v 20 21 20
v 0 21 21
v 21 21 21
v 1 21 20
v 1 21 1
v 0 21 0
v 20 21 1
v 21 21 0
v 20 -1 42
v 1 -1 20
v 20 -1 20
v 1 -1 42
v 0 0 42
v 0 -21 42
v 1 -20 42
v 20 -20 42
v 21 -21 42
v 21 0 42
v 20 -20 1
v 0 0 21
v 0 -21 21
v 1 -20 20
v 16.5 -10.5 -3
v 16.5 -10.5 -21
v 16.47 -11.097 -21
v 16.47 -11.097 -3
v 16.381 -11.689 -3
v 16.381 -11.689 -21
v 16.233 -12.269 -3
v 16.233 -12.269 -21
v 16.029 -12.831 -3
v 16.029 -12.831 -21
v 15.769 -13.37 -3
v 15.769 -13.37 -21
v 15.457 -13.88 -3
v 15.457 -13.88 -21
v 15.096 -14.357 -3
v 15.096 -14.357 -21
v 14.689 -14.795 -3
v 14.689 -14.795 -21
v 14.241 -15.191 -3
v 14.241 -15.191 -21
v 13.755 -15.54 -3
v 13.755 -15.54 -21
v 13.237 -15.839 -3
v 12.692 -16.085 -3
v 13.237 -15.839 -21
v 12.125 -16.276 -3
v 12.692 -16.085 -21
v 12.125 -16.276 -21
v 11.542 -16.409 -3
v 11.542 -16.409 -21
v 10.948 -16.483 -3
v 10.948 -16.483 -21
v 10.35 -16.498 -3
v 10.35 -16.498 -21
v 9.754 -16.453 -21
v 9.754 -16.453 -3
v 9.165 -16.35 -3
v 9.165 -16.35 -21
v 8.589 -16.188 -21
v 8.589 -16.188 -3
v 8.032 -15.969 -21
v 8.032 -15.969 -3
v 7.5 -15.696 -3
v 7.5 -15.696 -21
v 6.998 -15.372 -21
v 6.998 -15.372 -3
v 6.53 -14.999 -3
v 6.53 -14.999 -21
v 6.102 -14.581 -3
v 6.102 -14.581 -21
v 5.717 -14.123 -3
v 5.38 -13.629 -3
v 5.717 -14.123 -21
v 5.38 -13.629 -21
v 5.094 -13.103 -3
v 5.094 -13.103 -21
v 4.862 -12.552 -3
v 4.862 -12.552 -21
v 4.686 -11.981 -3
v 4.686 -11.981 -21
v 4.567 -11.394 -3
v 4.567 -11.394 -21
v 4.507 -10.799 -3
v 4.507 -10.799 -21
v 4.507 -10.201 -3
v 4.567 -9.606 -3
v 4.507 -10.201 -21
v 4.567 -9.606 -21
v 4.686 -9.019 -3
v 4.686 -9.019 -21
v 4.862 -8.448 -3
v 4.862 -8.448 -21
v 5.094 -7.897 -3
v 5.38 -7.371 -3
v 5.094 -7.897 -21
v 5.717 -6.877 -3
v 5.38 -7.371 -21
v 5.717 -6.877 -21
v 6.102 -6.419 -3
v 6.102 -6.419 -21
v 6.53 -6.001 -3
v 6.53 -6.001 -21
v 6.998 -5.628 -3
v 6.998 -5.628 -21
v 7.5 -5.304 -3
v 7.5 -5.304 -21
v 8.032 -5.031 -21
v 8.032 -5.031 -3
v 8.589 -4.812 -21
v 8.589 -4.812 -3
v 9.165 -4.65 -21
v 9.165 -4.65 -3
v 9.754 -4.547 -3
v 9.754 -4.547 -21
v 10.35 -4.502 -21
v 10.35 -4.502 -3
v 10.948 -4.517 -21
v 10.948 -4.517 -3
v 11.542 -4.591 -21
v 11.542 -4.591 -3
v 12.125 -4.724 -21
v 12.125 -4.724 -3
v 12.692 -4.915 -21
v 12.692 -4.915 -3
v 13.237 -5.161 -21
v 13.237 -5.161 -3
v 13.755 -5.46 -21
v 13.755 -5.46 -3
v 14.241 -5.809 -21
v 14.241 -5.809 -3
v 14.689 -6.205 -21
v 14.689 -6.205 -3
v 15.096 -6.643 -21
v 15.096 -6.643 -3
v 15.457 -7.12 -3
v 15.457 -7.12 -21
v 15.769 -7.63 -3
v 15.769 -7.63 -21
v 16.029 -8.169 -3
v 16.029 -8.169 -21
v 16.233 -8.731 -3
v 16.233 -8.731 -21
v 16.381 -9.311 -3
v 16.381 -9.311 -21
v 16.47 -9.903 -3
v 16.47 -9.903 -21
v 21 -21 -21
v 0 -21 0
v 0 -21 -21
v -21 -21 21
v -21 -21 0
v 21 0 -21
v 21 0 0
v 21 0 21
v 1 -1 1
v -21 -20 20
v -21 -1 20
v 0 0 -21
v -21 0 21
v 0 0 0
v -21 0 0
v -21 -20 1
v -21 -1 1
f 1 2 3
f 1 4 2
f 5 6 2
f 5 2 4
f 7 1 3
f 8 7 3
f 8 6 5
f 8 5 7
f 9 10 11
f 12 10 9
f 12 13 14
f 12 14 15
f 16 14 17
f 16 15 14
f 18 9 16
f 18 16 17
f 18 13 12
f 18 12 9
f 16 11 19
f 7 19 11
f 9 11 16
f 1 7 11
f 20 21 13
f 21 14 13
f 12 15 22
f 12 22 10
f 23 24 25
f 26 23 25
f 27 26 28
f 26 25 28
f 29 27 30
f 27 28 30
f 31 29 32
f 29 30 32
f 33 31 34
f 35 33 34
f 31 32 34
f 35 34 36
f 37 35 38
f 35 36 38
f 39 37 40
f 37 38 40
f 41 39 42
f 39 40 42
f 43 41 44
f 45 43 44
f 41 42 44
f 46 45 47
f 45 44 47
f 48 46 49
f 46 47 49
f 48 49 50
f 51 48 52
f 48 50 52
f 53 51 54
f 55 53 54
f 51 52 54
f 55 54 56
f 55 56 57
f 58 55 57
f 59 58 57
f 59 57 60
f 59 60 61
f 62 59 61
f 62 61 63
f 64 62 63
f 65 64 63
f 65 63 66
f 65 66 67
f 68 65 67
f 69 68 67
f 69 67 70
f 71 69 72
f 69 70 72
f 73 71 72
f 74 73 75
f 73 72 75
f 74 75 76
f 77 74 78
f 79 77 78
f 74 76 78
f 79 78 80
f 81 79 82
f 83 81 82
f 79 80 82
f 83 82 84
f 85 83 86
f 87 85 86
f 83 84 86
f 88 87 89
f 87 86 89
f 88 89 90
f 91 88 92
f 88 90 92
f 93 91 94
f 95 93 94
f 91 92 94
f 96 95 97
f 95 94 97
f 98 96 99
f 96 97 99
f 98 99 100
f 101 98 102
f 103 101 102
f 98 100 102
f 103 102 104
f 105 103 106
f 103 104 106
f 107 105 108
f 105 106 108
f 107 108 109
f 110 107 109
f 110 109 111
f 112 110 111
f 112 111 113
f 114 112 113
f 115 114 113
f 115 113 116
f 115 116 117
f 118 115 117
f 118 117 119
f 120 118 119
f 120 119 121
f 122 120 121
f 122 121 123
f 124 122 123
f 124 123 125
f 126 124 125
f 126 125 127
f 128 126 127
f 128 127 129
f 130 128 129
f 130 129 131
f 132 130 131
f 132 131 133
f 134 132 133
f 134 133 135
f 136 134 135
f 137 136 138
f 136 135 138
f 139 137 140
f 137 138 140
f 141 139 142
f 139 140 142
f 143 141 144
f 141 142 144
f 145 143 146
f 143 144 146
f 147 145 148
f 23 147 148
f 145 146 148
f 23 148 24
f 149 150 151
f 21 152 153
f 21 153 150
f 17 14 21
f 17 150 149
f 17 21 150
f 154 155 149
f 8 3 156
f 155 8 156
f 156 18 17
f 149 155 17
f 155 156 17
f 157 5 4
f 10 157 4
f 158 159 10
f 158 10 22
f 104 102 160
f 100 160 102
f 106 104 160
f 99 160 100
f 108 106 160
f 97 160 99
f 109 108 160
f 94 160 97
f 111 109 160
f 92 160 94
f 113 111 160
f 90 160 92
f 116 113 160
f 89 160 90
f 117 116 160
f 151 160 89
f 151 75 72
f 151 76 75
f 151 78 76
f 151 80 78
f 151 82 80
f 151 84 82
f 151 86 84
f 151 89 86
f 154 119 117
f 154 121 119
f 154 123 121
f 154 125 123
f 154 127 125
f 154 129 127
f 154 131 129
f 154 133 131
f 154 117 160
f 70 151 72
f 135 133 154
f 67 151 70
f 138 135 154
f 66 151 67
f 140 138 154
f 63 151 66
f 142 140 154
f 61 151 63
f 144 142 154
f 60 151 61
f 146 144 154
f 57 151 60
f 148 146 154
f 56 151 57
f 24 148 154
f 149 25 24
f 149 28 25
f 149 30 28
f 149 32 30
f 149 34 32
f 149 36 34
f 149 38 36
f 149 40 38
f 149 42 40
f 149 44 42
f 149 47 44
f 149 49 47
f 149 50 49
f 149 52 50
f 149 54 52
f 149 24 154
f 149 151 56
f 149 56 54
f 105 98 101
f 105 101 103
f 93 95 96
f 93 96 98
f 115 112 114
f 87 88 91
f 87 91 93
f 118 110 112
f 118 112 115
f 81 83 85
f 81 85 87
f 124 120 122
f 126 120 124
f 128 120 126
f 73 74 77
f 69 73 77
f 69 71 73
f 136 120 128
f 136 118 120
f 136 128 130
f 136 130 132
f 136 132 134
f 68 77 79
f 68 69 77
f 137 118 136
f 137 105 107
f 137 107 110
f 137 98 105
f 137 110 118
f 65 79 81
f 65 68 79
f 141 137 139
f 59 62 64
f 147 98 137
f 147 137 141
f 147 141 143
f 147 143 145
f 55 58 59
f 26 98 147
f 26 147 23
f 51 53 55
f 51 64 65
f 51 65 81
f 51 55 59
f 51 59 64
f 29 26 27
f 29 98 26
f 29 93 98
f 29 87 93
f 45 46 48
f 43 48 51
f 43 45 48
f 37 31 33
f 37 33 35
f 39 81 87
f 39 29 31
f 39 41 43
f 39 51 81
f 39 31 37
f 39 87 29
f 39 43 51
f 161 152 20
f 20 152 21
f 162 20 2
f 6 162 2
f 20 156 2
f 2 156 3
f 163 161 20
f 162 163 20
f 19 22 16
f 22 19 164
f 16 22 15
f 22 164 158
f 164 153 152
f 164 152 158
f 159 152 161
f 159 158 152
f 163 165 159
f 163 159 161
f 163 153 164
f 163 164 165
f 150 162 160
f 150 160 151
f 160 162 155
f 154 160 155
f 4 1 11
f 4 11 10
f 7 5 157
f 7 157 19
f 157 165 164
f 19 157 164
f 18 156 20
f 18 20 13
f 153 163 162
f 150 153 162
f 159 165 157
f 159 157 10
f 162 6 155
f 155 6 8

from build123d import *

# Parameters (mm, degrees)
F0_W      = 42
F0_H      = 42
F1_DEPTH  = 42
F2_W      = 21
F2_H      = 21
F3_DEPTH  = 42
F4_W      = 21
F4_H      = 21
F5_DEPTH  = 21
F6_W      = 21
F6_H      = 21
F7_DEPTH  = 21
F8_W      = 19
F8_H      = 19
F9_DEPTH  = 41
F10_W     = 19
F10_H     = 19
F11_DEPTH = 41
F12_W     = 19
F12_H     = 19
F13_DEPTH = 41
F14_W     = 21
F14_H     = 21
F15_DEPTH = 21
F16_R     = 6
F17_DEPTH = 18


with BuildPart() as f1:
    # F0 (on Top) → F1 (new body)
    with BuildSketch(Plane.XY):
        Rectangle(F0_W, F0_H)
    extrude(amount=F1_DEPTH)

    # F2 (on face) → F3 (cut, through all)
    with BuildSketch(Plane.XY.offset(42)):
        with Locations((-10.5, 10.5)):
            Rectangle(F2_W, F2_H)
    extrude(amount=-F3_DEPTH, mode=Mode.SUBTRACT)

    # F4 (on face) → F5 (cut, through all)
    with BuildSketch(Plane.XZ.offset(21)):
        with Locations((-10.5, 31.5)):
            Rectangle(F4_W, F4_H)
    extrude(amount=-F5_DEPTH, mode=Mode.SUBTRACT)

    # F6 (on face) → F7 (cut, through all)
    with BuildSketch(Plane.YZ.offset(21)):
        with Locations((10.5, 31.5)):
            Rectangle(F6_W, F6_H)
    extrude(amount=-F7_DEPTH, mode=Mode.SUBTRACT)

    # F8 (on face) → F9 (cut)
    with BuildSketch(Plane.XY.offset(42)):
        with Locations((10.5, -10.5)):
            Rectangle(F8_W, F8_H)
    extrude(amount=-F9_DEPTH, mode=Mode.SUBTRACT)

    # F10 (on face) → F11 (cut)
    with BuildSketch(Plane(origin=(-21, 0, 0), x_dir=(0, -1, 0), z_dir=(-1, 0, 0))):
        with Locations((10.5, 10.5)):
            Rectangle(F10_W, F10_H)
    extrude(amount=-F11_DEPTH, mode=Mode.SUBTRACT)

    # F12 (on face) → F13 (cut)
    with BuildSketch(Plane(origin=(0, 21, 0), x_dir=(-1, 0, 0), z_dir=(0, 1, 0))):
        with Locations((-10.5, 10.5)):
            Rectangle(F12_W, F12_H)
    extrude(amount=-F13_DEPTH, mode=Mode.SUBTRACT)

    # F14 (on face) → F15 (join)
    with BuildSketch(Plane(origin=(0, 0, 0), x_dir=(1, 0, 0), z_dir=(0, 0, -1))):
        with Locations((10.5, 10.5)):
            Rectangle(F14_W, F14_H)
    extrude(amount=F15_DEPTH)

    # F16 (on face) → F17 (cut)
    with BuildSketch(Plane(origin=(0, 0, -21), x_dir=(1, 0, 0), z_dir=(0, 0, -1))):
        with Locations((10.5, 10.5)):
            Circle(F16_R)
    extrude(amount=-F17_DEPTH, mode=Mode.SUBTRACT)


solid = f1.part
